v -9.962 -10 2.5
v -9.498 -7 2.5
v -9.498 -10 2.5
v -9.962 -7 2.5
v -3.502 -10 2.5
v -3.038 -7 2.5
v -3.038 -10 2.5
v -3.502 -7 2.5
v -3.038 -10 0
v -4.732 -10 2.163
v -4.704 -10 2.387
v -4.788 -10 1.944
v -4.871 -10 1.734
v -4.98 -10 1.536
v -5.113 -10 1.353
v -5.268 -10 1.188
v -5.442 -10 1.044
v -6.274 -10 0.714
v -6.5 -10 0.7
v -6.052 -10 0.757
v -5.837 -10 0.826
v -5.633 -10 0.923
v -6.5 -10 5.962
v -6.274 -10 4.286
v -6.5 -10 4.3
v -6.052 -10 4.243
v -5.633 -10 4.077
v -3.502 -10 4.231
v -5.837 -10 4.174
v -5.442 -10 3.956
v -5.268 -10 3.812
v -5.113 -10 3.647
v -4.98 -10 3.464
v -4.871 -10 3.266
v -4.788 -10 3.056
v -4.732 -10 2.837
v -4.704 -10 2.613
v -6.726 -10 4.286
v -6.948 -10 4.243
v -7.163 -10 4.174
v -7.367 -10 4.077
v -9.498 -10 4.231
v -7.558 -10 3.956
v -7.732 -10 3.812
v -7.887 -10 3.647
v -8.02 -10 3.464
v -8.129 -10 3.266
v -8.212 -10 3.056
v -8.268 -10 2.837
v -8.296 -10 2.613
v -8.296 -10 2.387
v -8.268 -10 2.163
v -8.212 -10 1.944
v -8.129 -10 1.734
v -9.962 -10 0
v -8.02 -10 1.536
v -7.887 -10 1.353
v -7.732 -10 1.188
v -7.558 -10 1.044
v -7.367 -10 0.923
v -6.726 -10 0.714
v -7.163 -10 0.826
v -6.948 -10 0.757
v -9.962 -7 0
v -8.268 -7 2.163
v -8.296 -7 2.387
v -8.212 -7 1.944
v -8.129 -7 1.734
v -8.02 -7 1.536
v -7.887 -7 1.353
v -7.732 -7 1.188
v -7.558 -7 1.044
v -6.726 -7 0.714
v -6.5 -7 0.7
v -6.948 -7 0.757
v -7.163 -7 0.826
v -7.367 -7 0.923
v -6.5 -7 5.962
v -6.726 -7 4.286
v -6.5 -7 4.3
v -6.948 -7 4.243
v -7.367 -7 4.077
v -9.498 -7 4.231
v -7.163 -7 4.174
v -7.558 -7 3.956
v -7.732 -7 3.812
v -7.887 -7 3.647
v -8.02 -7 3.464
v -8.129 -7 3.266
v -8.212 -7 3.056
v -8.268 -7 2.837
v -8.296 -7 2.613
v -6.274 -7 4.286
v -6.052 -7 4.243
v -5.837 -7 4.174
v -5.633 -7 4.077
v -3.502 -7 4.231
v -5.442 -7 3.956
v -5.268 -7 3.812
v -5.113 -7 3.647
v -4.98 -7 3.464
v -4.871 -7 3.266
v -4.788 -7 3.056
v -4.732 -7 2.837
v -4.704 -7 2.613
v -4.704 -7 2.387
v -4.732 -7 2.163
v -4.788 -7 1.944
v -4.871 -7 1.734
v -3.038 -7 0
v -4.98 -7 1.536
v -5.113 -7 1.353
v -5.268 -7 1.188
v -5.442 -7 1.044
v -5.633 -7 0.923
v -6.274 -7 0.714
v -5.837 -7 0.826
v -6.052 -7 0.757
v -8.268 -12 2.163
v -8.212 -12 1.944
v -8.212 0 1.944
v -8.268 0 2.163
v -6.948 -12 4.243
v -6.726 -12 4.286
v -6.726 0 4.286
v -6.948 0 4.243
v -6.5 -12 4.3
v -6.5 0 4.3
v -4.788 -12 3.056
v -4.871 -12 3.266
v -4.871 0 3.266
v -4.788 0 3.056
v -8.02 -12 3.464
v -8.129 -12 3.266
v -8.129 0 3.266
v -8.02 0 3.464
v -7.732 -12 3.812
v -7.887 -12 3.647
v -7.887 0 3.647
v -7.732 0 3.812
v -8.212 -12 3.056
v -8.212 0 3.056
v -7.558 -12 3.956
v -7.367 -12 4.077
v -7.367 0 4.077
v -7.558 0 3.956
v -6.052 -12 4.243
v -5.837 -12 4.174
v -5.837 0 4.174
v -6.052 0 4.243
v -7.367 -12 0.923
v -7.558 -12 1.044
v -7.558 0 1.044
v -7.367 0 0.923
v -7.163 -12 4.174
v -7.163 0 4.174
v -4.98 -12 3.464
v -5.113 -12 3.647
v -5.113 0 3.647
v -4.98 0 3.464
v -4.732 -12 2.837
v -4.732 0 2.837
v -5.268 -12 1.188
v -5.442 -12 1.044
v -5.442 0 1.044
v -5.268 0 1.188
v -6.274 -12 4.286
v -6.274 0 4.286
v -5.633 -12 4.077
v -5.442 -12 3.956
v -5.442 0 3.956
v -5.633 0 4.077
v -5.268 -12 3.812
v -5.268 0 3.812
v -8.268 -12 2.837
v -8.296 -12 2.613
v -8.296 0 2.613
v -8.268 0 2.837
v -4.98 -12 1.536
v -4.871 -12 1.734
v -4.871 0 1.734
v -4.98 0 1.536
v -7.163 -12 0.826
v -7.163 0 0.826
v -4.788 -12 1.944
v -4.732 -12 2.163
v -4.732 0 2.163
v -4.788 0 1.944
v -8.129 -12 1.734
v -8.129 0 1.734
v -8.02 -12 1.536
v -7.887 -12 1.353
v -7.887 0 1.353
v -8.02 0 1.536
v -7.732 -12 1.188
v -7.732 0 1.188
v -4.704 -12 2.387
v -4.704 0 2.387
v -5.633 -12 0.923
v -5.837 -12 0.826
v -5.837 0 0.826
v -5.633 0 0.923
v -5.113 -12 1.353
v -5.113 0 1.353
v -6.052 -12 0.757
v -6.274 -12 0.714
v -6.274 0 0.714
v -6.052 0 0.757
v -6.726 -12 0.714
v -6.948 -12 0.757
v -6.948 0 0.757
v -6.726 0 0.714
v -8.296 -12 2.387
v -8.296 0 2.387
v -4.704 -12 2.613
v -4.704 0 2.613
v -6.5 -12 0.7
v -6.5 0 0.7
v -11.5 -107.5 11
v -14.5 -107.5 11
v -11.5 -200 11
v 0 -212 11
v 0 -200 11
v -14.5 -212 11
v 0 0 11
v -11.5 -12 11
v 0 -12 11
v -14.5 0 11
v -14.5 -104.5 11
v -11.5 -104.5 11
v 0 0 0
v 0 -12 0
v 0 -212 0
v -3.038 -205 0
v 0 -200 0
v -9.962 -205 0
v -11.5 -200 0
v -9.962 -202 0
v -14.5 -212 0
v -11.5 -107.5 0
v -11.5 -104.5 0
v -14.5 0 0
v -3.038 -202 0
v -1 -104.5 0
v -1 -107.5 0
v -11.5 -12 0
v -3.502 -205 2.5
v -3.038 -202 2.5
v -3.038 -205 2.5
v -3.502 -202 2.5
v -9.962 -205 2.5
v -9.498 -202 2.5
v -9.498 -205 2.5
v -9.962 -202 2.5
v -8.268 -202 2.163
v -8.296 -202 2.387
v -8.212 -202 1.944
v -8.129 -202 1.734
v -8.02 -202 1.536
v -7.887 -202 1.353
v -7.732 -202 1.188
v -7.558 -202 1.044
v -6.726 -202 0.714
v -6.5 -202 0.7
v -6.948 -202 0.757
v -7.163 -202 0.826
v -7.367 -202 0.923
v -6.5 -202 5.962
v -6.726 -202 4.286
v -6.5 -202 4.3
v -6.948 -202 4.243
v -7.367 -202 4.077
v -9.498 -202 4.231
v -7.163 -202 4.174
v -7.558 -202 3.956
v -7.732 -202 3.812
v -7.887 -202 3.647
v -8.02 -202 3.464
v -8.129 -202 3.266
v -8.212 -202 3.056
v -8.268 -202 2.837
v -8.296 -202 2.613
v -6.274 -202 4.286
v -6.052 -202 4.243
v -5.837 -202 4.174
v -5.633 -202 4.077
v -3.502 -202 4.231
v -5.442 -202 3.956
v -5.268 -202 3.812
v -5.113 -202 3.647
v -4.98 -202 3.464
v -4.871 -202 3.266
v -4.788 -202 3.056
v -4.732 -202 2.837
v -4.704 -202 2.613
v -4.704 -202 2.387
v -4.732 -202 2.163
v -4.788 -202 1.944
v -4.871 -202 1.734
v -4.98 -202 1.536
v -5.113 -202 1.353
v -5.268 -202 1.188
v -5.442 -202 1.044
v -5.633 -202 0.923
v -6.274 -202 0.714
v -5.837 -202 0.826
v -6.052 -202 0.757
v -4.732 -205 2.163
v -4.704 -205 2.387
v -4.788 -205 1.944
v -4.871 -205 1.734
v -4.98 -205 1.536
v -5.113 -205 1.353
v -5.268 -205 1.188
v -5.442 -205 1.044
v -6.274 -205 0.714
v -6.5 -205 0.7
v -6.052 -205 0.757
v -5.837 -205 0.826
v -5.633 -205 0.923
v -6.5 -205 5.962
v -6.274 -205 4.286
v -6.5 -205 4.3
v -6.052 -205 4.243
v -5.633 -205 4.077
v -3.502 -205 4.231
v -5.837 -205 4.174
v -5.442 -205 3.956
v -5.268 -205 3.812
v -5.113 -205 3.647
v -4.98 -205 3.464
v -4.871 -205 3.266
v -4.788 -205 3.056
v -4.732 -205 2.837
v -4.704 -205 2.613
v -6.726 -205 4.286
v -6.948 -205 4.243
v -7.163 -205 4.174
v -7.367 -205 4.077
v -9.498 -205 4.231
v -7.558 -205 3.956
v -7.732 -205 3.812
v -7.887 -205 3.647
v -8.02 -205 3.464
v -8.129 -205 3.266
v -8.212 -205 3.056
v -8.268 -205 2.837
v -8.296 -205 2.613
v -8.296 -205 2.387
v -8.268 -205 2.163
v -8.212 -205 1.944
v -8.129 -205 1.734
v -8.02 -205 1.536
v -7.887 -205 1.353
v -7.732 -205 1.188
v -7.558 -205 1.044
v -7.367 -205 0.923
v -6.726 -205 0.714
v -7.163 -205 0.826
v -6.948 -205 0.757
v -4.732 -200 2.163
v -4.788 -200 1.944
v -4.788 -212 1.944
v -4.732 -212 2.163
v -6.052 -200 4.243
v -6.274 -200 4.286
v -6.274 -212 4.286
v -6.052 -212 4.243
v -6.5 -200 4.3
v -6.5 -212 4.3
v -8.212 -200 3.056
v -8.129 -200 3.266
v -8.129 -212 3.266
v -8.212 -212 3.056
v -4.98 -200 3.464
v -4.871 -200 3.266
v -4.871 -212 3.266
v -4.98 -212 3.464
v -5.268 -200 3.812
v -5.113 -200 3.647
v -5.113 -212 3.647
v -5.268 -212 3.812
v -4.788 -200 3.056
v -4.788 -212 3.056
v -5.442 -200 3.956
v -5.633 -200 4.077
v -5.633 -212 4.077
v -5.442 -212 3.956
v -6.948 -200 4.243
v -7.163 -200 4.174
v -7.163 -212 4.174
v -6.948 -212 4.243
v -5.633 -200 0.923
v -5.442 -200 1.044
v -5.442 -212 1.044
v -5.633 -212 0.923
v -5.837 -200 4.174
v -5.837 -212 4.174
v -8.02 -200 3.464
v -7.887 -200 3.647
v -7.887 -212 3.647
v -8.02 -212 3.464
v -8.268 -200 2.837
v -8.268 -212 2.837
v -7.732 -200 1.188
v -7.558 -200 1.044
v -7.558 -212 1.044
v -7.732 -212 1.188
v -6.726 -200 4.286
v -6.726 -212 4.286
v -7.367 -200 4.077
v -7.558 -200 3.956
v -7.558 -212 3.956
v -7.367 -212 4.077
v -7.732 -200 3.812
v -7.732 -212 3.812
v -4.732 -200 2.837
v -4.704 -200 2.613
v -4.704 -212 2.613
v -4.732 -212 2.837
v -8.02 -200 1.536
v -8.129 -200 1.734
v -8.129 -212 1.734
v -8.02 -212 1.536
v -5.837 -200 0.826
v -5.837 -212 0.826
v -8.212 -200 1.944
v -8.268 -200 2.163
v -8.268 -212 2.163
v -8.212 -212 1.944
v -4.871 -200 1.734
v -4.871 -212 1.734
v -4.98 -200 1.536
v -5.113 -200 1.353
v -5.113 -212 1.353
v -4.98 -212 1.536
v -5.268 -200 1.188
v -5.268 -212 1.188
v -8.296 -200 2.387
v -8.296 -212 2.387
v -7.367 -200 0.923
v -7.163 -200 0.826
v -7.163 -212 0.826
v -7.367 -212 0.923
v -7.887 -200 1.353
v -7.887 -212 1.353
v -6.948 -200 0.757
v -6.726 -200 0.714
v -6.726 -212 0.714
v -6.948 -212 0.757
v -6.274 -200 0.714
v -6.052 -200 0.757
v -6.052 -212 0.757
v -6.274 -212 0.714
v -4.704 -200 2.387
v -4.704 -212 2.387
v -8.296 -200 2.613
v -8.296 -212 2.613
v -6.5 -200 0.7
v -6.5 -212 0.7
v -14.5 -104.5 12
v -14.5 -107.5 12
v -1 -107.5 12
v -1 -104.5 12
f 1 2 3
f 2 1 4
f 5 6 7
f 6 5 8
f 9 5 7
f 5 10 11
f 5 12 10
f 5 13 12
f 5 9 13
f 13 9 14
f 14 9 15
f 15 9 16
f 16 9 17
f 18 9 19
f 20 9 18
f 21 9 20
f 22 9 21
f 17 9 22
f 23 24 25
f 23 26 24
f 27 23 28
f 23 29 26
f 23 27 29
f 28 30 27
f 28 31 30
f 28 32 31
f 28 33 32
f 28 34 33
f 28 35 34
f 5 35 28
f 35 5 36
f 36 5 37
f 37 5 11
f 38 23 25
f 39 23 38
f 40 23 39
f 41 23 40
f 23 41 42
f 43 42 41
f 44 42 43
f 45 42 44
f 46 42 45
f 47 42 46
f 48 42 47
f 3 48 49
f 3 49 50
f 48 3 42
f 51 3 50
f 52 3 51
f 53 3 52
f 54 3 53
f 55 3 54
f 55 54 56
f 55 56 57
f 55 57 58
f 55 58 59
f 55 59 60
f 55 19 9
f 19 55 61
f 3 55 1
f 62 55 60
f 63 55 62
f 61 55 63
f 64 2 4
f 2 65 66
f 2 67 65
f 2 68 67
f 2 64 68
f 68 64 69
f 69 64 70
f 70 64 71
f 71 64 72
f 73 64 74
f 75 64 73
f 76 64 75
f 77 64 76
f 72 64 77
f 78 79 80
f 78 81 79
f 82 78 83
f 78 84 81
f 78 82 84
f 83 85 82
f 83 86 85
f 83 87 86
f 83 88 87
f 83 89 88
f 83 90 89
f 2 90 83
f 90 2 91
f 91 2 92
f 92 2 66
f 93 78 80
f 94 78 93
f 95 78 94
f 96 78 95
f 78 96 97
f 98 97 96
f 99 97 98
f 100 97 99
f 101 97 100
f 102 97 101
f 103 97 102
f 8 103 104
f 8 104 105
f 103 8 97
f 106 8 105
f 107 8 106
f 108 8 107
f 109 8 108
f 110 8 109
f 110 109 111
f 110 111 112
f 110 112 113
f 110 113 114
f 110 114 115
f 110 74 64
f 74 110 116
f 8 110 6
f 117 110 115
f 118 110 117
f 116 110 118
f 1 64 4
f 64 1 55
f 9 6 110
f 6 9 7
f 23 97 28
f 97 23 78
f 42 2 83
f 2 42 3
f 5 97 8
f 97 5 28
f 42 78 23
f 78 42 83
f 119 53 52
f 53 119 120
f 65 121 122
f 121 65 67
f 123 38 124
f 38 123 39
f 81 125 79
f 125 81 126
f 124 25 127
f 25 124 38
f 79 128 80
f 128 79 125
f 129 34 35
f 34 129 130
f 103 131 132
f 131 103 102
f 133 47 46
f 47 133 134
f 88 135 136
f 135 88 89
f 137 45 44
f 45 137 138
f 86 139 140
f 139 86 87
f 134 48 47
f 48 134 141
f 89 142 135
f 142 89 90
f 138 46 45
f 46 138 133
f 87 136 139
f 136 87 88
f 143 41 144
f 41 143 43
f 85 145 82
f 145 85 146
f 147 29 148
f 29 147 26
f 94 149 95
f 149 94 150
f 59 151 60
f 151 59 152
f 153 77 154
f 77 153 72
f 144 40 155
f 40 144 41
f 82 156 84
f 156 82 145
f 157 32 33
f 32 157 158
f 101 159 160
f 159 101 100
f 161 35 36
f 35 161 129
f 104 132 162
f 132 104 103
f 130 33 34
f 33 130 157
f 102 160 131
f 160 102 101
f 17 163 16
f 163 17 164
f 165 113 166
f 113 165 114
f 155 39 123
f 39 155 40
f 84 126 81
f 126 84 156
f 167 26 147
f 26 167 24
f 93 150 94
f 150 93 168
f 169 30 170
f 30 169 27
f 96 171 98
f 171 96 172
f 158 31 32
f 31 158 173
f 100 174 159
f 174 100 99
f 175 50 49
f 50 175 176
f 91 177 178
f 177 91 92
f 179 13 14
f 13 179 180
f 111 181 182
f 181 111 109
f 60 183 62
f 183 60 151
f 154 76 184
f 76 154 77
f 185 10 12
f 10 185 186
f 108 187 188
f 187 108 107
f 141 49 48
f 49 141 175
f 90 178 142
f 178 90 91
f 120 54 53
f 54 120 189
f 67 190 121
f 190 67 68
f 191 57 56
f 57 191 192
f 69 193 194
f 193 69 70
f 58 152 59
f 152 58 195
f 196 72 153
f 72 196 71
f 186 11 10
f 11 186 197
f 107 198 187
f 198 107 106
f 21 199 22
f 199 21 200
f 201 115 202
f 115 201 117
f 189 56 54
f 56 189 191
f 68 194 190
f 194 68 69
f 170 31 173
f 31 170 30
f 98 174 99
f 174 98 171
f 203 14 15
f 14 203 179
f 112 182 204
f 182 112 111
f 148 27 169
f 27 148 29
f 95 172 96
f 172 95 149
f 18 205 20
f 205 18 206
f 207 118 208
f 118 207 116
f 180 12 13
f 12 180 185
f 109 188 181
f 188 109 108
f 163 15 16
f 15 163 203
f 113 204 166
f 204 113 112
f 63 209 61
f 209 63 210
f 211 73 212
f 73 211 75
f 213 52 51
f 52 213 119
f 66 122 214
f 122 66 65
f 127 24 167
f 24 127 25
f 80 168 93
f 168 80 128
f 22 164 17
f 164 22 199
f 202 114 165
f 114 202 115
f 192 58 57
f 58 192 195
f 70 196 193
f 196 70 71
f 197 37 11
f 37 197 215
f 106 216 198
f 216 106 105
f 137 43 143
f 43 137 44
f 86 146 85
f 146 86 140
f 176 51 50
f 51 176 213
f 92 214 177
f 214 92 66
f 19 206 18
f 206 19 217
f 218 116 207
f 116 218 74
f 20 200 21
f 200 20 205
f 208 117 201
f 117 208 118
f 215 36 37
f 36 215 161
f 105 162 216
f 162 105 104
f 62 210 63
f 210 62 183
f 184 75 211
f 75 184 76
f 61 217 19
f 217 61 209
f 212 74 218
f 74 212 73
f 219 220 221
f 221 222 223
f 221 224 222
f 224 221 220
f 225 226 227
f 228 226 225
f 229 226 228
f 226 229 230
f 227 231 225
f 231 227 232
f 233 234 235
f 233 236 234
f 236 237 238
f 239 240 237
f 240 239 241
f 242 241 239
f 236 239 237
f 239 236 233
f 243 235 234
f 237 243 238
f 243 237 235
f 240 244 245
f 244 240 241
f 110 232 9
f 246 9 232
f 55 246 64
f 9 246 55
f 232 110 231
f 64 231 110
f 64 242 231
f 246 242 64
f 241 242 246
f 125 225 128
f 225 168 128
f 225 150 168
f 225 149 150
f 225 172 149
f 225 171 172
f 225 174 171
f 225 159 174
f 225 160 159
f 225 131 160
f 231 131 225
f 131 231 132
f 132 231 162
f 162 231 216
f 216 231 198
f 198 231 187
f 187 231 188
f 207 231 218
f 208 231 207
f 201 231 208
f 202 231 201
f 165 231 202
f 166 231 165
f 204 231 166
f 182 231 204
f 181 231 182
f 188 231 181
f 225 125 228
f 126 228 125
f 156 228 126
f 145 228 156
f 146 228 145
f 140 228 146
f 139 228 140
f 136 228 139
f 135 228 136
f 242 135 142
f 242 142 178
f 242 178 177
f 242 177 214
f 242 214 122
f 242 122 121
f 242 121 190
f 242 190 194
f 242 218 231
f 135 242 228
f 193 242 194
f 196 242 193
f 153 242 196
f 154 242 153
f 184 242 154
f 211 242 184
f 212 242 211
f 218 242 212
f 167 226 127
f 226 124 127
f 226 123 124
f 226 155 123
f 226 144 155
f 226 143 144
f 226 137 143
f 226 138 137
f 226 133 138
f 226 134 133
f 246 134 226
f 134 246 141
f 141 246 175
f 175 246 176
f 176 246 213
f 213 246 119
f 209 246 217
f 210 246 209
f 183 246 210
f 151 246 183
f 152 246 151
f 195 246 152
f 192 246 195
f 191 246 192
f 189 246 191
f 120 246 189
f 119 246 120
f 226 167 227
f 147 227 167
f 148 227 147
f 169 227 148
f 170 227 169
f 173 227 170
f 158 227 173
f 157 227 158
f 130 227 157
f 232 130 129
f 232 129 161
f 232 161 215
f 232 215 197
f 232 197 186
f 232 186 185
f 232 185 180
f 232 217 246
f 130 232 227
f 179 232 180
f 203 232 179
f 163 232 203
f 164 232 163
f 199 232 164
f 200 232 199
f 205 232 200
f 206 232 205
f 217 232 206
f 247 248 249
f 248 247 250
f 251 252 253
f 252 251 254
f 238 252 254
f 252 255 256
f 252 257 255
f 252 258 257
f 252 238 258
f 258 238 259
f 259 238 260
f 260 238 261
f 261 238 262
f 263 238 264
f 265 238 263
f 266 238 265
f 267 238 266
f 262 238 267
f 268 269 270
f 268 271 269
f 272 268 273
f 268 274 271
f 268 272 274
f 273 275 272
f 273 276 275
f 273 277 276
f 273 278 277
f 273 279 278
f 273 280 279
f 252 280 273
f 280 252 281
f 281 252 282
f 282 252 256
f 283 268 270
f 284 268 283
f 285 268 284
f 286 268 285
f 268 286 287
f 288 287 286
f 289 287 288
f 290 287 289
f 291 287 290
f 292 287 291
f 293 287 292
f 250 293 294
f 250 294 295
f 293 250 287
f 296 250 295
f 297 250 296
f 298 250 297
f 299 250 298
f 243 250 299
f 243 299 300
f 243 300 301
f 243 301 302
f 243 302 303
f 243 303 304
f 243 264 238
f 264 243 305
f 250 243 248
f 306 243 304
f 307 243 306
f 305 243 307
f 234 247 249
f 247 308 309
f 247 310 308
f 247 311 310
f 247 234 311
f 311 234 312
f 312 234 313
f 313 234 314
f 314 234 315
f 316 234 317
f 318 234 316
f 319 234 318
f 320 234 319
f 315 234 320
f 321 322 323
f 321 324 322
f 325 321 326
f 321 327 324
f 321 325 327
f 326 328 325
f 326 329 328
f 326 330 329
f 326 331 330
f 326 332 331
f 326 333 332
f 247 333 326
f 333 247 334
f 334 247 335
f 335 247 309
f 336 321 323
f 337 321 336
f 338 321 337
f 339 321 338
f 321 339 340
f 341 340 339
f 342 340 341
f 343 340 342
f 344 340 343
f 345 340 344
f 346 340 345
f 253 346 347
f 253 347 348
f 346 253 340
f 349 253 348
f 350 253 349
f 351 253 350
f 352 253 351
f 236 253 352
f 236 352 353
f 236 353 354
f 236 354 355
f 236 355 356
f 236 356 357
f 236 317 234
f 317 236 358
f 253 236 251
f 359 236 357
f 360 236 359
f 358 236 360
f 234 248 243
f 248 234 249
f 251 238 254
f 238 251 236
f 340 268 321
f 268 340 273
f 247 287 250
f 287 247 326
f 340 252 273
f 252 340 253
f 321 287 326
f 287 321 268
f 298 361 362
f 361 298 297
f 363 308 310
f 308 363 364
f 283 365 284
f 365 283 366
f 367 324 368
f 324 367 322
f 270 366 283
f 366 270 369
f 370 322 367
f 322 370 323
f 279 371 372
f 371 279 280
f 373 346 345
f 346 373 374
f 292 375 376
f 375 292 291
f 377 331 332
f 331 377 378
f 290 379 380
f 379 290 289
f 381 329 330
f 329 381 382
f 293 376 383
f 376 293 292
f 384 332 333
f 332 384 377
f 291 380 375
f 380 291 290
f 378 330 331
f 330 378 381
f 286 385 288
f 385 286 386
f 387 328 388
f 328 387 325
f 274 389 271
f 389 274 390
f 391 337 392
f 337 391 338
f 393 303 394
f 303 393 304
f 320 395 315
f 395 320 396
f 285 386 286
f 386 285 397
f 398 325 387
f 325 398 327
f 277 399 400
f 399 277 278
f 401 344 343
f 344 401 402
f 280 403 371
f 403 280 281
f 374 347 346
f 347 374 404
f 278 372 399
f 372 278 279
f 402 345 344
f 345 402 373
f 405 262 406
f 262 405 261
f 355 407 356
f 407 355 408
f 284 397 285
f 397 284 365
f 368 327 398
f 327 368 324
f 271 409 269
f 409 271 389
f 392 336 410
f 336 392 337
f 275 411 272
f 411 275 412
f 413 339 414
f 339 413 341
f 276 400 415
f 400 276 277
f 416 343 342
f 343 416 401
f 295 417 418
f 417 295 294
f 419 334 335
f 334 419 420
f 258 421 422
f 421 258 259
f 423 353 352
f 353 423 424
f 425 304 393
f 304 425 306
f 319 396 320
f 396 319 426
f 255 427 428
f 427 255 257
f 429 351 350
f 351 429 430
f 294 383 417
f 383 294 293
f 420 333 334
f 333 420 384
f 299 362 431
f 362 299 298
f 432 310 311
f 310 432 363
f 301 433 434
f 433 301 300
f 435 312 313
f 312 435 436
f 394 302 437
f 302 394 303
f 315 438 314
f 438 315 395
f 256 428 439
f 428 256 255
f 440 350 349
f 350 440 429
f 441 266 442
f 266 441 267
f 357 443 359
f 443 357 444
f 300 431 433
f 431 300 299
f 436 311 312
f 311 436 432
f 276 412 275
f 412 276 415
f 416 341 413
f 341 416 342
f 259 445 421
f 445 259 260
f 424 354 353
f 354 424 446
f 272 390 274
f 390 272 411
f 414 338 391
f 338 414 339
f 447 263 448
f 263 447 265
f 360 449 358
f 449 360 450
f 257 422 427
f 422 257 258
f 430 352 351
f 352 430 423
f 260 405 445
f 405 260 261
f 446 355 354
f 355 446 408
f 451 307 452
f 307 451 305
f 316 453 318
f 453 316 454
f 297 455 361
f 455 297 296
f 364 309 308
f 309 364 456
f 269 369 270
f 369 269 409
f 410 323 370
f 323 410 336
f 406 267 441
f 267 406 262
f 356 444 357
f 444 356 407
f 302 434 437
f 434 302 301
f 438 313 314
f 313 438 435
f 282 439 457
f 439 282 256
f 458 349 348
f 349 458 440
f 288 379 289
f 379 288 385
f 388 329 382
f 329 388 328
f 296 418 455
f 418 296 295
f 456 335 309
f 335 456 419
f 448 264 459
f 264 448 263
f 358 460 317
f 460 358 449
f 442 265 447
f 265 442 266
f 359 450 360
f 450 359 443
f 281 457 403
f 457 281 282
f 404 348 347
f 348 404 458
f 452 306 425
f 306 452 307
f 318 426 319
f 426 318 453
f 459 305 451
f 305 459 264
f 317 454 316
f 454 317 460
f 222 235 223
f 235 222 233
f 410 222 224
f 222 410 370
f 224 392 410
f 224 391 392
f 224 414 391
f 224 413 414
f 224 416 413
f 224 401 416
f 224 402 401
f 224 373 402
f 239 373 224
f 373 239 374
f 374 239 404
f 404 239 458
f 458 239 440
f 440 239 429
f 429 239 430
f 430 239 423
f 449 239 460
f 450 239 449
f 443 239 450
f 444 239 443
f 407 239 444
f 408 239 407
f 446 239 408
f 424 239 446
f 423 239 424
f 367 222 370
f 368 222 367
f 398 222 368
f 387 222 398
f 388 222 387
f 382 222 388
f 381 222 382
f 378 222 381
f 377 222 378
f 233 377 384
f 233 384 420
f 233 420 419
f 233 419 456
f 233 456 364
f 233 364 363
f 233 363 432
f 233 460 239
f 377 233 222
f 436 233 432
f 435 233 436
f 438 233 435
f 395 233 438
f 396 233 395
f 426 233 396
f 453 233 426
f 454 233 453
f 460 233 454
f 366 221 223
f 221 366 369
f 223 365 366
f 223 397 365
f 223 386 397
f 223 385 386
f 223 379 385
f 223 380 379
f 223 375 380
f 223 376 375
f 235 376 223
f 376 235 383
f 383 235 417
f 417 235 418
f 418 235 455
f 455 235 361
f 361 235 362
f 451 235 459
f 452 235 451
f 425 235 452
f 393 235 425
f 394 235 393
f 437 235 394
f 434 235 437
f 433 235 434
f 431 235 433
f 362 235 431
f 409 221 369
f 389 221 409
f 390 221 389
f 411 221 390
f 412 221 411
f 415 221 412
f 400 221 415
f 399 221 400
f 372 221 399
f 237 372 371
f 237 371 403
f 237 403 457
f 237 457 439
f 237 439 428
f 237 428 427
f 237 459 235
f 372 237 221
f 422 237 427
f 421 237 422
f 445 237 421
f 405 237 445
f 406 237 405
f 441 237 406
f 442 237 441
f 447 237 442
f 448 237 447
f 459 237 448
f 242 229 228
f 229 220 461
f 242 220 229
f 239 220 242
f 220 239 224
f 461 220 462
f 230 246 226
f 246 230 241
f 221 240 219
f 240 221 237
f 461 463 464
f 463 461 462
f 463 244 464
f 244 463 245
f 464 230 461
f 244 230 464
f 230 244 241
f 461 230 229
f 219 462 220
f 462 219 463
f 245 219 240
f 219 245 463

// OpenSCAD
$fn = 50;

difference() {
	union() {
		translate(v = [0, 0, 0]) {
			rotate(a = [0, 0, 0]) {
				difference() {
					union() {
						translate(v = [0, 0, 2.5]) {
							rotate(a = [0, -90, 0]) {
								difference() {
									union() {
										translate(v = [0, 0, 0]) {
											rotate(a = [0, 0, 0]) {
												difference() {
													union() {
														translate(v = [-2.5, -12.0, 0.0]) {
															cube(size = [11.0, 12.0, 13.0]);
														}
													}
													union() {
														translate(v = [0, -7.0, 6.5]) {
															rotate(a = [90, 0, 0]) {
																difference() {
																	union() {
																		translate(v = [-20.0, -3.4619999999999997, 0]) {
																			cube(size = [20, 6.9239999999999995, 3]);
																		}
																		linear_extrude(height = 3) {
																			polygon(points = [[3.4619999999999997, 0.0], [1.7310000000000003, 2.9981799479017264], [-1.7309999999999992, 2.9981799479017264], [-3.4619999999999997, 4.2397272186481365e-16], [-1.7310000000000014, -2.998179947901726], [1.7309999999999977, -2.9981799479017277]]);
																		}
																	}
																	union();
																}
															}
														}
														translate(v = [0, 0.1, 6.5]) {
															rotate(a = [90, 0, 0]) {
																cylinder(h = 20.0, r = 1.8);
															}
														}
													}
												}
											}
										}
										translate(v = [0, -212.0, 13.0]) {
											rotate(a = [180, 0, 0]) {
												difference() {
													union() {
														translate(v = [-2.5, -12.0, 0.0]) {
															cube(size = [11.0, 12.0, 13.0]);
														}
													}
													union() {
														translate(v = [0, -7.0, 6.5]) {
															rotate(a = [90, 0, 0]) {
																difference() {
																	union() {
																		translate(v = [-20.0, -3.4619999999999997, 0]) {
																			cube(size = [20, 6.9239999999999995, 3]);
																		}
																		linear_extrude(height = 3) {
																			polygon(points = [[3.4619999999999997, 0.0], [1.7310000000000003, 2.9981799479017264], [-1.7309999999999992, 2.9981799479017264], [-3.4619999999999997, 4.2397272186481365e-16], [-1.7310000000000014, -2.998179947901726], [1.7309999999999977, -2.9981799479017277]]);
																		}
																	}
																	union();
																}
															}
														}
														translate(v = [0, 0.1, 6.5]) {
															rotate(a = [90, 0, 0]) {
																cylinder(h = 20.0, r = 1.8);
															}
														}
													}
												}
											}
										}
										translate(v = [-2.5, -212.0, 11.5]) {
											cube(size = [11.0, 212.0, 3.0]);
										}
										translate(v = [-2.5, -107.5, 1.0]) {
											cube(size = [12.0, 3.0, 13.5]);
										}
									}
									union();
								}
							}
						}
					}
					union();
				}
			}
		}
	}
	union();
}
